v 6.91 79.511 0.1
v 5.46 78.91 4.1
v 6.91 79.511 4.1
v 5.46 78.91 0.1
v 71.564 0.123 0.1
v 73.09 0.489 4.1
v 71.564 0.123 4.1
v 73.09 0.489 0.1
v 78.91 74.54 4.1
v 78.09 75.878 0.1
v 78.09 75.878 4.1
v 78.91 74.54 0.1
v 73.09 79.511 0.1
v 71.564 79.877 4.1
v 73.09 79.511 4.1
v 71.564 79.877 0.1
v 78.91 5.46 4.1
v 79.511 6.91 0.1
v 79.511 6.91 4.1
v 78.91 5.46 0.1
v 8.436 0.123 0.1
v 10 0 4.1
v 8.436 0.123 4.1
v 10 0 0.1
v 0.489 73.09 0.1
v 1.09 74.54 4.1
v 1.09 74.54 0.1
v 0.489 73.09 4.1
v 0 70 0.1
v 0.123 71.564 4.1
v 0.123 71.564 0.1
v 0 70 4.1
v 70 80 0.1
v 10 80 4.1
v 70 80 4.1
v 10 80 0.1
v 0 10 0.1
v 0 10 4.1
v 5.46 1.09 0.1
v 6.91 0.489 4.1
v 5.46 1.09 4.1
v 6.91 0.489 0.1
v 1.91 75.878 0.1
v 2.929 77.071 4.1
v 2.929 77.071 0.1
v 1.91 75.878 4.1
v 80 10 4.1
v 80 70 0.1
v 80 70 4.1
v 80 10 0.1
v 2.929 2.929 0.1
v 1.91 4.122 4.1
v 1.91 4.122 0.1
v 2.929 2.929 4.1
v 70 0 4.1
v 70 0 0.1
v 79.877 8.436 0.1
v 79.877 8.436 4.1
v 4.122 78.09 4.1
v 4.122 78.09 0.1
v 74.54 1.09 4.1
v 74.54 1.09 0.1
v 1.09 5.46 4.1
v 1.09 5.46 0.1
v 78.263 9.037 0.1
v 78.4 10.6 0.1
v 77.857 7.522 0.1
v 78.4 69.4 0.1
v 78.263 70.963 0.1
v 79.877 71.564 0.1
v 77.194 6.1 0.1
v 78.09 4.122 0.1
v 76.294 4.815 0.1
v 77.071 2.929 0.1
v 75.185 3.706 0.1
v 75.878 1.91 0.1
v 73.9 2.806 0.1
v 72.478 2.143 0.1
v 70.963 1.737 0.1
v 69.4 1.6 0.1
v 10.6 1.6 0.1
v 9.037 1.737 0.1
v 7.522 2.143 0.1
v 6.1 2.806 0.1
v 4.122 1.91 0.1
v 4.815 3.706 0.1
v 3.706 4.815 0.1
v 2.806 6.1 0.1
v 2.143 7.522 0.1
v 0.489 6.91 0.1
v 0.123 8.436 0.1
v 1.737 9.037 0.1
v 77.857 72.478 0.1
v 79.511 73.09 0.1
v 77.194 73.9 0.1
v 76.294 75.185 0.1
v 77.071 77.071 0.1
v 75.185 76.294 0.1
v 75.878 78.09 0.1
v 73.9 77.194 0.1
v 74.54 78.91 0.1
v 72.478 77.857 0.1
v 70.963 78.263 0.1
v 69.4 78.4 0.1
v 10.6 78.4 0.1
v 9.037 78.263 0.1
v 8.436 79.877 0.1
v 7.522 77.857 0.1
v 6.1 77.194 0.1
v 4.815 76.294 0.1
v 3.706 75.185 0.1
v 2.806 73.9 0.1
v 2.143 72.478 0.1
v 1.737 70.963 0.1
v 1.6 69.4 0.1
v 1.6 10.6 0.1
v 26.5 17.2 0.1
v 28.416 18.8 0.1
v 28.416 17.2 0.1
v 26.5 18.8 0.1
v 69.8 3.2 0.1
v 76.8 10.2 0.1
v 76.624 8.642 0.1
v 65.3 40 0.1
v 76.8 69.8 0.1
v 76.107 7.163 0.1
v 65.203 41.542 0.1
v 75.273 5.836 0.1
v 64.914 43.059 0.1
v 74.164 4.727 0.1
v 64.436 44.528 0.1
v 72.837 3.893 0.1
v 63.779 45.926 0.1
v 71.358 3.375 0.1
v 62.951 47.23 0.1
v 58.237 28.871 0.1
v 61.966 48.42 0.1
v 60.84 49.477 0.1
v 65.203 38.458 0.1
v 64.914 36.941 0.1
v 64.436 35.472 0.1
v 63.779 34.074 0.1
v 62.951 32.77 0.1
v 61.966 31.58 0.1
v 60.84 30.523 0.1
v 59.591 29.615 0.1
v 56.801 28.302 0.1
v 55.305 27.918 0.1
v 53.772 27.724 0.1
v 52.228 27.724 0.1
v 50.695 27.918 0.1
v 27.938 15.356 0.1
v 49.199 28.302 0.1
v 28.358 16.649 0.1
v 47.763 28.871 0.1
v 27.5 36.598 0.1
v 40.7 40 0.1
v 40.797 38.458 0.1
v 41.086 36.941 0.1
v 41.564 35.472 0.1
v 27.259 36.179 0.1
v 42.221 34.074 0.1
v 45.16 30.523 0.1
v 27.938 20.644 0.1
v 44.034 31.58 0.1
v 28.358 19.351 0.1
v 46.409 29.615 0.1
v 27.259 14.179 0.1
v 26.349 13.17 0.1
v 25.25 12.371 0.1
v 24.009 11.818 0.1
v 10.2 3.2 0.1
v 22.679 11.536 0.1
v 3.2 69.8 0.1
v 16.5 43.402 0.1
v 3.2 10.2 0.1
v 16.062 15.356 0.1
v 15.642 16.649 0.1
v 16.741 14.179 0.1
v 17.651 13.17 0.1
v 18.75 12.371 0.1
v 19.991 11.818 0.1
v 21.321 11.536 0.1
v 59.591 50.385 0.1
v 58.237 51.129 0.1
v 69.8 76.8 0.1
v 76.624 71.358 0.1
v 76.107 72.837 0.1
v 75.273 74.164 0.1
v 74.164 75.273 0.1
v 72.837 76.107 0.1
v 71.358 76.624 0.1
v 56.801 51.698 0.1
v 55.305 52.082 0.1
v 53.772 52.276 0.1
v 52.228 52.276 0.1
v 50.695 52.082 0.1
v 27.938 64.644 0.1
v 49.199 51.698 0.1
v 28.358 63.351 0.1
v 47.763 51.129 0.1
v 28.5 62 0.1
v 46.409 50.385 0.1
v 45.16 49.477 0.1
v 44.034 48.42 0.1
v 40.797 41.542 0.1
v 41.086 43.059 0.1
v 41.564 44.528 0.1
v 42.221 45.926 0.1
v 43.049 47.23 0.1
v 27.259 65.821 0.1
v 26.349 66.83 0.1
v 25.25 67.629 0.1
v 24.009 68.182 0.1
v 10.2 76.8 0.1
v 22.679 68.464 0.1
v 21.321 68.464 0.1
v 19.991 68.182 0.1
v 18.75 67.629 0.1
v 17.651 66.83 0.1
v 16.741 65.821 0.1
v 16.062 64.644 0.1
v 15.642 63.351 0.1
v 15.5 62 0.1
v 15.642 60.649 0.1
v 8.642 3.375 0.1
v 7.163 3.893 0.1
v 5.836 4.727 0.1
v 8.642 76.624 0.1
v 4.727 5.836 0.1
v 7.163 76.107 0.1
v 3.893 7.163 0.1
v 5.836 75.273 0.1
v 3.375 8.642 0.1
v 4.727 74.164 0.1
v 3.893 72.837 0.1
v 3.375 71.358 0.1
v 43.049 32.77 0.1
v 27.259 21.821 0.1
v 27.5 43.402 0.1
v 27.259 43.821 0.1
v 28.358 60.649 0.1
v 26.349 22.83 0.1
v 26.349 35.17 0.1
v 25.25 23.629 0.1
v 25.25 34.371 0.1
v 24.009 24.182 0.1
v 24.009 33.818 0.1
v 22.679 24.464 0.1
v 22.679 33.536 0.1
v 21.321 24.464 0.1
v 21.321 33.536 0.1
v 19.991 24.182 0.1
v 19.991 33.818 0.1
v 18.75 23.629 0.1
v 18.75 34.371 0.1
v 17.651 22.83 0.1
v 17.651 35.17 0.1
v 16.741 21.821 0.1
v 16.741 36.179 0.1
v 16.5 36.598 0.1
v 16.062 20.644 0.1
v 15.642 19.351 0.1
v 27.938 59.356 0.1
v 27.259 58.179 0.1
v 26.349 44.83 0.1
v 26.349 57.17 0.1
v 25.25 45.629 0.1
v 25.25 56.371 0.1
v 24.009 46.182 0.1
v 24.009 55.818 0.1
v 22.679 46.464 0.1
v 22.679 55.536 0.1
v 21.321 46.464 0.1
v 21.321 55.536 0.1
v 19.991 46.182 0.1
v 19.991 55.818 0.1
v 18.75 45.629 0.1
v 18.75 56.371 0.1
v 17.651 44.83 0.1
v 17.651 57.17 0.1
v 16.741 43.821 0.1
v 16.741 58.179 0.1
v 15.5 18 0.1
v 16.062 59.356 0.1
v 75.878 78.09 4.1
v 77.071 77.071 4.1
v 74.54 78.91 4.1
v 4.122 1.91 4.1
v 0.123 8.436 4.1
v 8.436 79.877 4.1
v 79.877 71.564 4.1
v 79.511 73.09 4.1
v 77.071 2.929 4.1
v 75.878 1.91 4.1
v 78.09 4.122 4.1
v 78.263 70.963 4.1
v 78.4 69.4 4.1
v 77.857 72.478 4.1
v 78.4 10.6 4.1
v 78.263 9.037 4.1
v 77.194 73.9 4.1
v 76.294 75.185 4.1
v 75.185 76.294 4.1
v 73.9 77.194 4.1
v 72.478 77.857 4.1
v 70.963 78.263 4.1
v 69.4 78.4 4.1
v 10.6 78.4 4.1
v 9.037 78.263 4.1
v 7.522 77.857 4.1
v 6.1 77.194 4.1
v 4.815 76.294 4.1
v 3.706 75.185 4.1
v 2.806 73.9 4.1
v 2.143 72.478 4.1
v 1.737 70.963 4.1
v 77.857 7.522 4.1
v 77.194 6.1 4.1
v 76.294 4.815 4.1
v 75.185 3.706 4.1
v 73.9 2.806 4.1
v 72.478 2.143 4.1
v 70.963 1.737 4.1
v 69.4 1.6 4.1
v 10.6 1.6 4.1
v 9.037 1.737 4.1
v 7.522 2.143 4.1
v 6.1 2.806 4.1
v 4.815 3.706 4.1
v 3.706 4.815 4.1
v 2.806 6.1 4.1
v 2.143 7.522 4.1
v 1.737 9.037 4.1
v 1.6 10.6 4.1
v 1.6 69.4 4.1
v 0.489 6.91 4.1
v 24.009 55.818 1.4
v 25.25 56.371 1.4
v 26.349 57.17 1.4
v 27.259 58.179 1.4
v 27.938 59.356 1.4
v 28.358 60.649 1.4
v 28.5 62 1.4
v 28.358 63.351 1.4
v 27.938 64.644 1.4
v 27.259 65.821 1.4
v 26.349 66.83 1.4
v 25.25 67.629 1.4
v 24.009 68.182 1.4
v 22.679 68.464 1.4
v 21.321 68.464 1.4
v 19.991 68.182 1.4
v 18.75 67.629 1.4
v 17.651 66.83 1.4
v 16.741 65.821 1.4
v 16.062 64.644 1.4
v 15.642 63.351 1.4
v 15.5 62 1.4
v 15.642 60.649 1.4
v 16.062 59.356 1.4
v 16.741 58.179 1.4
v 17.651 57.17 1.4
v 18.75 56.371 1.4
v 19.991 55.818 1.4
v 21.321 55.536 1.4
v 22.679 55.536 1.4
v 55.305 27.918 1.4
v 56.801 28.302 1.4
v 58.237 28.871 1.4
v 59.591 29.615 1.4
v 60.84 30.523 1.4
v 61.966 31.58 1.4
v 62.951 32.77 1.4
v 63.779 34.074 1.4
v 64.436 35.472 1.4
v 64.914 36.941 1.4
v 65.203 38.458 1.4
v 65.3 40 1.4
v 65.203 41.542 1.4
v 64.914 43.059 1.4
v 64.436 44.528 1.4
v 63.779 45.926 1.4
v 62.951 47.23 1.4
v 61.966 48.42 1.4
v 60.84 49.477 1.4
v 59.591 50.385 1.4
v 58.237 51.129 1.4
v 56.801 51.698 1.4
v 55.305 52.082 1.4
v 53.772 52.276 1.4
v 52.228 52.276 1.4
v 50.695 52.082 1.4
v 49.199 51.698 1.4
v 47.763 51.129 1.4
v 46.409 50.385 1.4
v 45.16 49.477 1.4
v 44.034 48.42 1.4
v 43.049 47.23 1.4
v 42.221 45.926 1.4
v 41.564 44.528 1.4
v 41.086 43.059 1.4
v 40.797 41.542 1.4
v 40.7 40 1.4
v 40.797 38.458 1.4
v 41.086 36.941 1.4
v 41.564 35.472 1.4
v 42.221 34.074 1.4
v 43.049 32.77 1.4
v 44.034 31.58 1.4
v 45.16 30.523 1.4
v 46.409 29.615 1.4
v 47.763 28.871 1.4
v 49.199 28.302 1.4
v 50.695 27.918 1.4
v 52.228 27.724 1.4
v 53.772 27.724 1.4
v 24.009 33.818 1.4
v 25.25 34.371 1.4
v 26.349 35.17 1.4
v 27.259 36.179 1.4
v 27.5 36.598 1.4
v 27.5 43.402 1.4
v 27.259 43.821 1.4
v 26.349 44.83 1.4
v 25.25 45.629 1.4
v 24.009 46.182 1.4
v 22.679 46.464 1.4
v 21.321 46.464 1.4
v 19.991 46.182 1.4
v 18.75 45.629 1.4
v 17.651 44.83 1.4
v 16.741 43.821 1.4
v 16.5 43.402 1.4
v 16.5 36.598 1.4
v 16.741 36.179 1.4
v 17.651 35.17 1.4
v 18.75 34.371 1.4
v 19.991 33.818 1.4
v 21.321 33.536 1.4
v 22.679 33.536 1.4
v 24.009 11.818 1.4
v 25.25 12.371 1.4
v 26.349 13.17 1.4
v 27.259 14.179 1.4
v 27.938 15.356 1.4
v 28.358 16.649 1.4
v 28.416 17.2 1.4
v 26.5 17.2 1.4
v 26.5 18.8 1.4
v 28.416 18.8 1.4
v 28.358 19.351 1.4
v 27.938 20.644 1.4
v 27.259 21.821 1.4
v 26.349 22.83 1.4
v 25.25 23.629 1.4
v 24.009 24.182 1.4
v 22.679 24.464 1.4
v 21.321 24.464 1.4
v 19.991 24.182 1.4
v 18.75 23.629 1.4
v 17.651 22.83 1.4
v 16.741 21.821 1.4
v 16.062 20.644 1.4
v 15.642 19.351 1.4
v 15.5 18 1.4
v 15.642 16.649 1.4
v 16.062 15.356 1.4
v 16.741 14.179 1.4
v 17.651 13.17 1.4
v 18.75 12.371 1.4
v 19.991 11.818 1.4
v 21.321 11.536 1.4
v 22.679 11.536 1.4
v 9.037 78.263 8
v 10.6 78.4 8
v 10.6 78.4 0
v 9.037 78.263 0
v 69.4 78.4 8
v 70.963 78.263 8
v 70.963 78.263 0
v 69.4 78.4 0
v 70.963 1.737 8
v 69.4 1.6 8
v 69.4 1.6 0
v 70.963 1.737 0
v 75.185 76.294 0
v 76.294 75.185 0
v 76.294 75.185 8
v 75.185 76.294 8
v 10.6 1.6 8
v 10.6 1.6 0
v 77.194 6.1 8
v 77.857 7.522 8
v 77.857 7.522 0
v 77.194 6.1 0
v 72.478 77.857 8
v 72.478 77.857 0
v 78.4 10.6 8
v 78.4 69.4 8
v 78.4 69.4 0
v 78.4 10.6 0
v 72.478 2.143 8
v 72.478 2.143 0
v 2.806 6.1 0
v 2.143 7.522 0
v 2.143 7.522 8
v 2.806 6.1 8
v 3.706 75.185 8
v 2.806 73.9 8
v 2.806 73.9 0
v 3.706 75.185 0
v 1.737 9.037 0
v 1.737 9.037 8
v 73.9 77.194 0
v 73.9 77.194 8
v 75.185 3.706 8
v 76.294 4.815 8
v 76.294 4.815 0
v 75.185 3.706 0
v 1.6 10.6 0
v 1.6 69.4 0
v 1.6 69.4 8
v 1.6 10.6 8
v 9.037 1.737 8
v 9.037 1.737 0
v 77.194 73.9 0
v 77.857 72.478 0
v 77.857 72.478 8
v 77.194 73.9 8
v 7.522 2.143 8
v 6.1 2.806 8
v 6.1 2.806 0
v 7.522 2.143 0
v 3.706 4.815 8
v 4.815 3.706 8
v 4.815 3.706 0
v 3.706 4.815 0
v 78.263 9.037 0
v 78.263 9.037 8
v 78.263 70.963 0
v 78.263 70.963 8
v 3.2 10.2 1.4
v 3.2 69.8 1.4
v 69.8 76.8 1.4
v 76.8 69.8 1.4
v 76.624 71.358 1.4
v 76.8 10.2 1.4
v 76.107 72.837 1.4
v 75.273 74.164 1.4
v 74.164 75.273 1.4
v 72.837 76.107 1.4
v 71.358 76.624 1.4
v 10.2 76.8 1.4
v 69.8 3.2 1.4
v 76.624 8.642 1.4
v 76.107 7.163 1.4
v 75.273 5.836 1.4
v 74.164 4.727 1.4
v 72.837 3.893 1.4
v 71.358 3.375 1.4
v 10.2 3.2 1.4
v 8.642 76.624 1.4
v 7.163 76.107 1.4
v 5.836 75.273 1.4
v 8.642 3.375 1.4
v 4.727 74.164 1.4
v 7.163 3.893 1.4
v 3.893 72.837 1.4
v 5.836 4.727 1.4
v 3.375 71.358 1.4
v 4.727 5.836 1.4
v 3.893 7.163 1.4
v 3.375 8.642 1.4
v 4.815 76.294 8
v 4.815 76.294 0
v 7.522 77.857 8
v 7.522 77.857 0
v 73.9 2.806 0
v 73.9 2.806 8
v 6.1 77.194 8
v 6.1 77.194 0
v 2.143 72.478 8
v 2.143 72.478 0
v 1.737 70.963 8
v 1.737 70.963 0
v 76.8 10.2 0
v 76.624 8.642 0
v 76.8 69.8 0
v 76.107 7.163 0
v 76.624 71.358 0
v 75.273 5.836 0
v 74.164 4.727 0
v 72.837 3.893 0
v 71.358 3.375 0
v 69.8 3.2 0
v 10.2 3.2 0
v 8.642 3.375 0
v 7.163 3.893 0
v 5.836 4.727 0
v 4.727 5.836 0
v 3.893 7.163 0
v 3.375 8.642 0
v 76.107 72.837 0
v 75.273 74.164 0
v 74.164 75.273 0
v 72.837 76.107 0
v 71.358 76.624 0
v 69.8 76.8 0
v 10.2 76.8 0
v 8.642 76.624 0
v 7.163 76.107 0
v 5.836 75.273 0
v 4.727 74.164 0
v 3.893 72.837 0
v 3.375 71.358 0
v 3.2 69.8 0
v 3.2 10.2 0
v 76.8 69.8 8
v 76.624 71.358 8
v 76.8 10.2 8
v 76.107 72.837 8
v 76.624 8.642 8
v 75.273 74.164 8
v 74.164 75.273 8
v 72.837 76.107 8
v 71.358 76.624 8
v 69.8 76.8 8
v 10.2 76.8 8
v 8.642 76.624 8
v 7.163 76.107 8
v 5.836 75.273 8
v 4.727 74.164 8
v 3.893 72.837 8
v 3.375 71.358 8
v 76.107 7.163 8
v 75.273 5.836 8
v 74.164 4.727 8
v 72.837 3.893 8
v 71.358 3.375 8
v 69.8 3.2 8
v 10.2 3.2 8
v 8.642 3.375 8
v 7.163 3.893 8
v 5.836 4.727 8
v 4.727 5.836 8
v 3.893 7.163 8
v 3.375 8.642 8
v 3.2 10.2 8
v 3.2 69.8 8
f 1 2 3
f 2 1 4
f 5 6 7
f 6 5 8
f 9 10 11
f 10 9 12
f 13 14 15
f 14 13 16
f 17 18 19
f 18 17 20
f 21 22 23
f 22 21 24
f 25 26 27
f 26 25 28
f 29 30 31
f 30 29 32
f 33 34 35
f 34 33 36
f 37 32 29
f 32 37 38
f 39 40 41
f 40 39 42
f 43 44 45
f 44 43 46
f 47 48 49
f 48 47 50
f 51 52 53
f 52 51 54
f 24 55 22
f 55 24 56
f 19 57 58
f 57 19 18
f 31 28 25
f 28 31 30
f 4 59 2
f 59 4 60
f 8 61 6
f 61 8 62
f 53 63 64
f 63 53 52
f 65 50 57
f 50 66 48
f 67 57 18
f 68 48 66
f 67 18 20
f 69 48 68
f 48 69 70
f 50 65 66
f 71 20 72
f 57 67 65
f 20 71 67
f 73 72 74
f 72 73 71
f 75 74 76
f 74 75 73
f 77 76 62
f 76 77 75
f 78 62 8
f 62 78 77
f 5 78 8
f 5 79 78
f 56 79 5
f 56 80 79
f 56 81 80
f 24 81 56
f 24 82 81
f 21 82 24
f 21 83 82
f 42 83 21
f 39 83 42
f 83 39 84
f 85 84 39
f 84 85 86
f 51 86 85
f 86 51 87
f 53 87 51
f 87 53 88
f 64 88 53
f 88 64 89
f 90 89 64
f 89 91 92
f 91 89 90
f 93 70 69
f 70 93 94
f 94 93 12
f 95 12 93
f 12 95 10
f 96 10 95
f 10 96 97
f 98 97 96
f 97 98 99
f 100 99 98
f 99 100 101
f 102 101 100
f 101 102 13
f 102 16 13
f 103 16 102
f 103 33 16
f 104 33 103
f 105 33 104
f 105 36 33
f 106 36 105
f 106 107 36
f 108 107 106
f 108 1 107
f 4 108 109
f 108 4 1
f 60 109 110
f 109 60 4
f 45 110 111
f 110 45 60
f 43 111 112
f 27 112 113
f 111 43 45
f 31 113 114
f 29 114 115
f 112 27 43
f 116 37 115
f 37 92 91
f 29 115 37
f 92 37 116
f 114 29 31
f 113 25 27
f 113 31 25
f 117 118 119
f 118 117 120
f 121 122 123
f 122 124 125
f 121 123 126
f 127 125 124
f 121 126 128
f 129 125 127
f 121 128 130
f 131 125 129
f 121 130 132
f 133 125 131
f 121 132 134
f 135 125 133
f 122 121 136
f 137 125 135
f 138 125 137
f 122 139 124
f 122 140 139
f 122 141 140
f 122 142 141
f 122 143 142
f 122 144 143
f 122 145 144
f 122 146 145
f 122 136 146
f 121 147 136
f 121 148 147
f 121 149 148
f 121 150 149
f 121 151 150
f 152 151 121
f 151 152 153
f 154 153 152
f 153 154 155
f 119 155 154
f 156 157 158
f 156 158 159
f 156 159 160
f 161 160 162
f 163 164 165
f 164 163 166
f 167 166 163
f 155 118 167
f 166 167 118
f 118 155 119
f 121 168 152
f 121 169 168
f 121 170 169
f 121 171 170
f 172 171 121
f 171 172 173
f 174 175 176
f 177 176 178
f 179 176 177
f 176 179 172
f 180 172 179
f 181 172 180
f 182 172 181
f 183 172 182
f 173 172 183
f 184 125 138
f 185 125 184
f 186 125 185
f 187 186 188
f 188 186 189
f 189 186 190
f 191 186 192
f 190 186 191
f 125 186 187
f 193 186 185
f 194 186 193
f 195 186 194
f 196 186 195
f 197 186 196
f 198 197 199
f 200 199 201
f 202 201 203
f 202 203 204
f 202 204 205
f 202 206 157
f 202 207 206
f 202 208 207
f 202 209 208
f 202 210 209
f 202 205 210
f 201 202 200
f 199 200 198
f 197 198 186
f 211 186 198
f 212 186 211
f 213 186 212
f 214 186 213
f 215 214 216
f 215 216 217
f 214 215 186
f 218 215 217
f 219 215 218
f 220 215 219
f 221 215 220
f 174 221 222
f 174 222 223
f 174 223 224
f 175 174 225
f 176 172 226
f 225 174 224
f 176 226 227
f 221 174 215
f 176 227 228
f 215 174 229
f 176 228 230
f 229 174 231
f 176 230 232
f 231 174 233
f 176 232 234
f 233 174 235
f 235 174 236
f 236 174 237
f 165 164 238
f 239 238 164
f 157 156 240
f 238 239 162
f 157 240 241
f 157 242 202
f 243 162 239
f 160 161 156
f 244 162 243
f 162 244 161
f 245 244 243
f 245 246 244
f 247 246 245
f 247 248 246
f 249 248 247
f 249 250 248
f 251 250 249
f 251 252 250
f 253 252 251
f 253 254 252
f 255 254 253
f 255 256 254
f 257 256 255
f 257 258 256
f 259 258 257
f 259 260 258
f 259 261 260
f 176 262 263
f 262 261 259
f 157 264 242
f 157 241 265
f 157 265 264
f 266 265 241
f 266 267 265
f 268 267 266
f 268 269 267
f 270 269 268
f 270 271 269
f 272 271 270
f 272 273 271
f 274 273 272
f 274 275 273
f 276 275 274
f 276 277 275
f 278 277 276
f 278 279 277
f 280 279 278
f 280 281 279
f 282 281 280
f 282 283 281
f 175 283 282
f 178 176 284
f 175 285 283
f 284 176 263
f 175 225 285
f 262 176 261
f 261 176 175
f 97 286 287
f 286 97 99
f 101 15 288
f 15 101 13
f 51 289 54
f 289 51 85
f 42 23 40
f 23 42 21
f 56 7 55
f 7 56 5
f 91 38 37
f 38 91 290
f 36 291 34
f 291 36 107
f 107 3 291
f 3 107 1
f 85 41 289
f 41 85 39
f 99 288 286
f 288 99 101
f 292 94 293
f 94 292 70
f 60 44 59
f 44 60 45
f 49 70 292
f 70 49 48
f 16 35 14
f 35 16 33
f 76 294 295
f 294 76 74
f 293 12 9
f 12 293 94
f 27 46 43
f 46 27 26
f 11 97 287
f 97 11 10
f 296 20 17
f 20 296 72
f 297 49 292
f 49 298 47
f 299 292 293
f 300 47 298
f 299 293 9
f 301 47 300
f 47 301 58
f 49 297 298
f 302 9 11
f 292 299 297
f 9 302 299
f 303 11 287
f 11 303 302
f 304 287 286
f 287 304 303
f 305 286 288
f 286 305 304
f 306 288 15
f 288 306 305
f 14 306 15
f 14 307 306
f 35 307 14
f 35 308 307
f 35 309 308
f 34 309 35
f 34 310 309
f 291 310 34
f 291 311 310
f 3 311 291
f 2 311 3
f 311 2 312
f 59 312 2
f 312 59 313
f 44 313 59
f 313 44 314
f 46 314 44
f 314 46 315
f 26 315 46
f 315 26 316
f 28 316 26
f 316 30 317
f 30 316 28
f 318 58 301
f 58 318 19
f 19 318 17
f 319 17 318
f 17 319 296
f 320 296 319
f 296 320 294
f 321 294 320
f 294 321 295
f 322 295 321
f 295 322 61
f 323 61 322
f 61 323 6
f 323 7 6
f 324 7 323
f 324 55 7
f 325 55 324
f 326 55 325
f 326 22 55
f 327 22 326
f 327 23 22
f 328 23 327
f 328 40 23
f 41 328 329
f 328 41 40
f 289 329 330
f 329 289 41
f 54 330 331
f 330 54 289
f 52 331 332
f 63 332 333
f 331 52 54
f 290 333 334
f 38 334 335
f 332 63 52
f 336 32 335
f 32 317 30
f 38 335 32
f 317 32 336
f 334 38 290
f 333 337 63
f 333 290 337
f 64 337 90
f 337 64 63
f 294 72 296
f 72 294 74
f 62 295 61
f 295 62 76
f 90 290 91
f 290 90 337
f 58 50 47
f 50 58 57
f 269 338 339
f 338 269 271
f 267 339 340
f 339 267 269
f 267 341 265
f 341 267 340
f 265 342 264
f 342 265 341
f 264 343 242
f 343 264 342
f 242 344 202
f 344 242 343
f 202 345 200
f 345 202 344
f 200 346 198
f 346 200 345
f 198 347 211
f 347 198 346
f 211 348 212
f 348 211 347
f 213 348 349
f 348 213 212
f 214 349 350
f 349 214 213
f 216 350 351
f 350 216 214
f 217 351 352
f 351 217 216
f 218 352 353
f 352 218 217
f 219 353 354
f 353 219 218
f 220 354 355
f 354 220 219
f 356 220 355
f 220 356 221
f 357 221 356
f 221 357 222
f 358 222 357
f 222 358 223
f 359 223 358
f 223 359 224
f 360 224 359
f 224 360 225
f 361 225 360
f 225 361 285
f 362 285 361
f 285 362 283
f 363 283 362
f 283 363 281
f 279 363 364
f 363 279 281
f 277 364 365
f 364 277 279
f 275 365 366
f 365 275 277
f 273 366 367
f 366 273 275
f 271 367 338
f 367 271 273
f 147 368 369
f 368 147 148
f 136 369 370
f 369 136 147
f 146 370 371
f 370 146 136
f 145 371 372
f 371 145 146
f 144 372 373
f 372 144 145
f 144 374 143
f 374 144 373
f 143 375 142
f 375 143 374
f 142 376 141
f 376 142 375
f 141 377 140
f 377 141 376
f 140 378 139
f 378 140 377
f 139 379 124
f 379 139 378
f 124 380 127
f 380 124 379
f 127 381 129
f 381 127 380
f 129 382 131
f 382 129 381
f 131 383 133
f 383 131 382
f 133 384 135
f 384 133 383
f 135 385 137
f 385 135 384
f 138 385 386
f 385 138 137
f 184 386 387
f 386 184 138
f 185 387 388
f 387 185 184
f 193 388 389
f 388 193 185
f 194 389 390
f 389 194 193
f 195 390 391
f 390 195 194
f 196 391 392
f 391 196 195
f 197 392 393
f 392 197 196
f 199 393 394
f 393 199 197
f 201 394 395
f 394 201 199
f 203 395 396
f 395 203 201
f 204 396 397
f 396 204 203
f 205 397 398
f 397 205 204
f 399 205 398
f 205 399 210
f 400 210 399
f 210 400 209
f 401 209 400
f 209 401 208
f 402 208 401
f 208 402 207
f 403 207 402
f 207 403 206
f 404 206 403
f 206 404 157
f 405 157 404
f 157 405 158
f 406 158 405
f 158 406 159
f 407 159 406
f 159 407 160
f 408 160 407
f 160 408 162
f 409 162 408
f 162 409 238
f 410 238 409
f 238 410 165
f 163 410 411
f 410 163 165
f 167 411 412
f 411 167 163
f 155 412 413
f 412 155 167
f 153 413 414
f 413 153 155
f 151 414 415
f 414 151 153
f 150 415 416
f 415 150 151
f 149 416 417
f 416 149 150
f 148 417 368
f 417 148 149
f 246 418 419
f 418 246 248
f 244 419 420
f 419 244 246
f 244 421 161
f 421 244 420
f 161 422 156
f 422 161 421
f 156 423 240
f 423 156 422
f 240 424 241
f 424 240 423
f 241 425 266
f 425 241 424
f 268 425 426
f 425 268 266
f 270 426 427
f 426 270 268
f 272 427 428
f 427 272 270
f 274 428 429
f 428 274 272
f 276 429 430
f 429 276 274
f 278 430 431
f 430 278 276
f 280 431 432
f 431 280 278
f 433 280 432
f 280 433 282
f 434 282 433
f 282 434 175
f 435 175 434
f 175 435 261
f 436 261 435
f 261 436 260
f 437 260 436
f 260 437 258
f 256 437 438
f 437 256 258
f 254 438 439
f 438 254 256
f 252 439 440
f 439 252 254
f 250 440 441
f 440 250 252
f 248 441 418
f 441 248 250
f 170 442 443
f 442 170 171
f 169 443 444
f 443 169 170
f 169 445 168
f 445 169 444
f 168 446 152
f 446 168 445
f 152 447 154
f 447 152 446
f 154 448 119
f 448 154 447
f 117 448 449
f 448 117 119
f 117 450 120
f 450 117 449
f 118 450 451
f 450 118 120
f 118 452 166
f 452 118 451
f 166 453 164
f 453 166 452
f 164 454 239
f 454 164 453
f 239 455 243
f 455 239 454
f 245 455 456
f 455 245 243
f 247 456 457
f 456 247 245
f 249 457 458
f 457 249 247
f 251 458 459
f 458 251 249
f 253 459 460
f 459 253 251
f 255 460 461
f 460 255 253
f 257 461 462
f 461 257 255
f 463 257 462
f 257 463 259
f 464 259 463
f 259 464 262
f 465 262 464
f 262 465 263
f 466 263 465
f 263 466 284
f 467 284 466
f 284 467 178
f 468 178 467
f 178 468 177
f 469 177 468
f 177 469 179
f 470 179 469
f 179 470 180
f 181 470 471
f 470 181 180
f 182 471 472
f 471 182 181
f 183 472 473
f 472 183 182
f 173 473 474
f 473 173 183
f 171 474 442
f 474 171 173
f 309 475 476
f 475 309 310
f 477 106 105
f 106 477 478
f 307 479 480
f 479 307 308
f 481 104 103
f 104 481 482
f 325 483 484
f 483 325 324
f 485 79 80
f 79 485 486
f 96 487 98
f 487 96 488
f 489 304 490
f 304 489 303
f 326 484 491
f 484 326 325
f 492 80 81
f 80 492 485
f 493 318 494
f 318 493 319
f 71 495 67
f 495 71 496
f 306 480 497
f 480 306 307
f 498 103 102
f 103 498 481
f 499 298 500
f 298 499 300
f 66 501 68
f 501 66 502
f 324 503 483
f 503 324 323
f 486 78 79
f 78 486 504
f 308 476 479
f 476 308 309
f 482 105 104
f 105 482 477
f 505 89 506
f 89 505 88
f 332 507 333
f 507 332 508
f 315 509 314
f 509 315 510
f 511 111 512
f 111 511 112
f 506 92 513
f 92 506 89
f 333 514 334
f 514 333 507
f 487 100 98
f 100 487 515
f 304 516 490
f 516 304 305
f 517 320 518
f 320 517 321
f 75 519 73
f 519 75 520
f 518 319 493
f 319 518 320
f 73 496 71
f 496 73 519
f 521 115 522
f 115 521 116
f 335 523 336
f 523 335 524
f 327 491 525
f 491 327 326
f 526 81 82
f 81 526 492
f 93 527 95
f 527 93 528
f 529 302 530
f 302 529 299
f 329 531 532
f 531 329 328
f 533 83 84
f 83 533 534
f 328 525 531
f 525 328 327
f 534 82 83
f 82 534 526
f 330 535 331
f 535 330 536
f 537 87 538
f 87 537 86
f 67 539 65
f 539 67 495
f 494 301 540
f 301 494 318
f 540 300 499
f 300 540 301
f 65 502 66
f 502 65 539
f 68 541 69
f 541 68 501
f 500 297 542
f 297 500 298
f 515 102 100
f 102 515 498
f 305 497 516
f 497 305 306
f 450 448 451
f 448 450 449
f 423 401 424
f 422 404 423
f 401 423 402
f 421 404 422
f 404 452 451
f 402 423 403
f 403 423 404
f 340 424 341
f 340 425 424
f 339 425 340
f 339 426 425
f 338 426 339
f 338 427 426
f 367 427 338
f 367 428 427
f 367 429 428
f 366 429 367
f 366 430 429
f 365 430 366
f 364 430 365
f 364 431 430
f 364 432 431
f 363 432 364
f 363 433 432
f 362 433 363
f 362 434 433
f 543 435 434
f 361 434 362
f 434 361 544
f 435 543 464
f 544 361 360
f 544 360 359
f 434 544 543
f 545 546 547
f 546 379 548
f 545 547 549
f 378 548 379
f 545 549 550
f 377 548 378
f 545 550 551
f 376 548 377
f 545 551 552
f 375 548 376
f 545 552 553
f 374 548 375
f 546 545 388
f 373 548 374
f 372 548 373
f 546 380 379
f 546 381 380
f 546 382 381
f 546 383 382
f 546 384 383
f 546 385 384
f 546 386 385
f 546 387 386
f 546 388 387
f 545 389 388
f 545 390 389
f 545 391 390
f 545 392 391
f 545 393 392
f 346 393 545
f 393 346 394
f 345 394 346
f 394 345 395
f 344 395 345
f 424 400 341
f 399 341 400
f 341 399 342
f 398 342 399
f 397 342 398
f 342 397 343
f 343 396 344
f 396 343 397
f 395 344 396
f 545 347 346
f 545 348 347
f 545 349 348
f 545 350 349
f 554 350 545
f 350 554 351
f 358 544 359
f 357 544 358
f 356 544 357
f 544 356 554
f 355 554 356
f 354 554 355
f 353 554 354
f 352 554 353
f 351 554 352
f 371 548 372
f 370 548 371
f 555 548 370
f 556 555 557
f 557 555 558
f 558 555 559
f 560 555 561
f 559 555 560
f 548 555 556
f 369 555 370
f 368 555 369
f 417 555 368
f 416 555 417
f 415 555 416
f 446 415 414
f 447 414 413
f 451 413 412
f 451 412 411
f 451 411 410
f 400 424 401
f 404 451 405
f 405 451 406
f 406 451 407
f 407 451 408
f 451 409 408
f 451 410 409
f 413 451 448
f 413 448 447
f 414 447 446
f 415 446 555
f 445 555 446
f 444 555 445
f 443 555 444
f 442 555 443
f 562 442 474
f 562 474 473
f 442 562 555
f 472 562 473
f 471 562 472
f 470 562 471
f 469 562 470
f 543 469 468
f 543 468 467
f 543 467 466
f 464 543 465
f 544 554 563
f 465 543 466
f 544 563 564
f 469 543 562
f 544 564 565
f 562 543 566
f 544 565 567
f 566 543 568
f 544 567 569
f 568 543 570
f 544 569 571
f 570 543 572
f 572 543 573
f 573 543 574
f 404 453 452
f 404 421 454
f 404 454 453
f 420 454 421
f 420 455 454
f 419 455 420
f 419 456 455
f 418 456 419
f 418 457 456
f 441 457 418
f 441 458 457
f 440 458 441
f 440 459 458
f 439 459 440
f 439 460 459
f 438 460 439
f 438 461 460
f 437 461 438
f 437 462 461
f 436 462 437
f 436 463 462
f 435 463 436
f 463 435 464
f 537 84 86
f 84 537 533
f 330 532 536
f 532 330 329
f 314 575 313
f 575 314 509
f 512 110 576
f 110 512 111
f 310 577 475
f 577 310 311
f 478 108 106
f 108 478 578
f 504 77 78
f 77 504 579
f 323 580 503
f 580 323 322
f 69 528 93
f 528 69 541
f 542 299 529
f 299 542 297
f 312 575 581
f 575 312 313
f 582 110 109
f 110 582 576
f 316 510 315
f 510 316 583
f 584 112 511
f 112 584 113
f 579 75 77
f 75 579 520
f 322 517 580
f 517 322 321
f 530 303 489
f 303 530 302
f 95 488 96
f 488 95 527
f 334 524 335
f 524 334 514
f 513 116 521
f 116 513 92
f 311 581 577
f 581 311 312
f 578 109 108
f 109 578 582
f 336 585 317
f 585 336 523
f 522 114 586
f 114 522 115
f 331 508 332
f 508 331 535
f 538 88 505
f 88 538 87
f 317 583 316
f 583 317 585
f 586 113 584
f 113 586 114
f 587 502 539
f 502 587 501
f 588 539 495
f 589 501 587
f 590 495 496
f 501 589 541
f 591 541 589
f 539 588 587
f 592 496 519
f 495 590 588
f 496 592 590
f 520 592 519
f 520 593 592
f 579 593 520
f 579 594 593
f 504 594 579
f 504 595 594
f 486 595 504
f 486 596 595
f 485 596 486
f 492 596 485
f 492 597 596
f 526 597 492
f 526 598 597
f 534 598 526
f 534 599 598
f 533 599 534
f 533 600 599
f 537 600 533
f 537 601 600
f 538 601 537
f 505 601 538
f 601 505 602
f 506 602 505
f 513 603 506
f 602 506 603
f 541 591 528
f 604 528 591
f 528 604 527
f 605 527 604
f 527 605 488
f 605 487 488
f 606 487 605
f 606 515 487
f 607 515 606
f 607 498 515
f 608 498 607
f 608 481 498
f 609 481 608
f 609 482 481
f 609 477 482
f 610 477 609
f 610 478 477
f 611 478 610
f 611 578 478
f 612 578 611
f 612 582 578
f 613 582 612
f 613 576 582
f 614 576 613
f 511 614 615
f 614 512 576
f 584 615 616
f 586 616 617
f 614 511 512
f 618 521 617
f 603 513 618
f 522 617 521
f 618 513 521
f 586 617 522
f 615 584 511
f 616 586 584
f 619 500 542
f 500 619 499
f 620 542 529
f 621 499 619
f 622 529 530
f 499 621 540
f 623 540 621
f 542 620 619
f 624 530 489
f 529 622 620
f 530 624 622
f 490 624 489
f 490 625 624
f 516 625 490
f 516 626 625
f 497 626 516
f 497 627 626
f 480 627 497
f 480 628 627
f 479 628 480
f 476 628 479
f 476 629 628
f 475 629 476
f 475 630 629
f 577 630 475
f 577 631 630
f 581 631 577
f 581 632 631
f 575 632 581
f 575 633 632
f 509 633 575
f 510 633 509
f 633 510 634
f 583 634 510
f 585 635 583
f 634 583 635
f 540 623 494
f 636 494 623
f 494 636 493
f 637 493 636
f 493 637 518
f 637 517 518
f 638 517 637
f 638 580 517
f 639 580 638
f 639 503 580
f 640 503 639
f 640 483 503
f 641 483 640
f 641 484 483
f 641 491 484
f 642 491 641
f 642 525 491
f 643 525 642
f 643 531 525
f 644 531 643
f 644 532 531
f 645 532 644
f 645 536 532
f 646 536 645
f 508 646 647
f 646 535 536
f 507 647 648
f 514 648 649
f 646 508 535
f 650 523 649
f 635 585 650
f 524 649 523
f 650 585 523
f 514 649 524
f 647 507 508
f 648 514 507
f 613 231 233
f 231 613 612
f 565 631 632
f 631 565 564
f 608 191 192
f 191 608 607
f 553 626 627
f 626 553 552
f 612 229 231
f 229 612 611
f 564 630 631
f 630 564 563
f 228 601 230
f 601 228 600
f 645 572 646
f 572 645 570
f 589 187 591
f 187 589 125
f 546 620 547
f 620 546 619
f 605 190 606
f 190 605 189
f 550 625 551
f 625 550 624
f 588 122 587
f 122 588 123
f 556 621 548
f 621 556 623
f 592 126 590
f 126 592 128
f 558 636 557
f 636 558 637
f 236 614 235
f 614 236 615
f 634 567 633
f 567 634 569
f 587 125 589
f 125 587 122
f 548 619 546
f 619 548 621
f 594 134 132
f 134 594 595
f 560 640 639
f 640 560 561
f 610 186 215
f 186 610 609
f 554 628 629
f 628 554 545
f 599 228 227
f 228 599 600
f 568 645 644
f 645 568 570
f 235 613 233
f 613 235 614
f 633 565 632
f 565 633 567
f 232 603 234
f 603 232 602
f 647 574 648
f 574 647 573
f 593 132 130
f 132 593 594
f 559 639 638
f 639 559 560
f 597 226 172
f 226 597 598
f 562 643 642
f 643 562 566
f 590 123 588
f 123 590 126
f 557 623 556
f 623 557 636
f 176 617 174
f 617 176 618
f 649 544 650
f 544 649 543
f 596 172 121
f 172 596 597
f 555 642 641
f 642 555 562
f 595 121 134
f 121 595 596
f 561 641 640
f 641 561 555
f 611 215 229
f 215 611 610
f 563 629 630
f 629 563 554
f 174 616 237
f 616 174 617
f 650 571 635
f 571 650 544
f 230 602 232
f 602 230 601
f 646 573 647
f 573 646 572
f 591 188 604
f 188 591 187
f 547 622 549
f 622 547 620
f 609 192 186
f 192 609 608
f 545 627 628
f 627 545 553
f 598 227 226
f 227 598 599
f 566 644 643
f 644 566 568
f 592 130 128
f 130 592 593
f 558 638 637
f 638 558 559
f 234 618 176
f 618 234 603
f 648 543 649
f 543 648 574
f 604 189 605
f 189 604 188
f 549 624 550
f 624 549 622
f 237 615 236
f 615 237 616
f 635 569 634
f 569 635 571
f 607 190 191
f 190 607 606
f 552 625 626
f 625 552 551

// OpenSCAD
boxw=80;
boxh=80;
boxd=4;
wallt=1.6;
rr=10;
take1();
module take2() {
difference() {
  cube([80,30,3]);
  translate([15,15,-.01]) encoder_cutout();
  translate([65,15,-.01]) encoder_cutout();
}
}
module take1(tw=boxw,th=boxh,td=boxd,wallt=wallt) {
 {
   difference() {
    translate([0,0,0.1]) cube2([tw,th,td],rr);
    linear_extrude(wallt) {
      *translate([tw/2,14]) slider_cutout();
      translate([22,th/4-2]) toggle_switch_cutout();
      translate([22,th/2]) key_switch_cutout();
      translate([22,th/4*3+2]) circle(d=13,$fn=30);
      *translate([14,52]) toggle_switch_cutout();
      //translate([tw-16,th-16]) encoder_cutout();
      translate([tw-27,th/2]) lightup_button_cutout();
    }
    translate([wallt,wallt,wallt-0.2]) cube2([tw-wallt*2,th-wallt*2,td+rr],rr-(boxd>20?2:1),boxd>20);
  }
    if(boxd<20)
      difference() {
    translate([wallt,wallt]) cube2([tw-wallt*2,th-wallt*2,td+4],rr-1,0);
    translate([wallt*2,wallt*2,-.01]) cube2([tw-wallt*4,th-wallt*4,td+5],rr-3,0);
        
      }
  /*
  cube([tw,wallt,td]);
  cube([wallt,th,td]);
  translate([0,th-wallt]) cube([tw,wallt,td]);
  translate([tw-wallt,0]) cube([wallt,th,td]);
  //*/
}
}
module encoder_cutout()
{
  cylinder(d=7.5,h=4,$fn=30);
  translate([-6.2,-6.2,2]) cube([12.4,12.4,2]);
  translate([-1.2,-7,2]) cube([2.4,2,2]);
}
module lightup_button_cutout()
{
  //circle(d=46,$fn=80);
  circle(d=24.6,$fn=50);
}
module toggle_switch_cutout()
{
  difference() {
    circle(d=13,$fn=30);
    translate([4.5,-.8]) square([2,1.6]);
  }
}

module key_switch_cutout()
{
  intersection(){
    circle(d=13,$fn=30);
    translate([-5.5,-6.5]) square([11,13]);
  }
}
module slider_cutout()
{
  translate([-32.5,0]) circle(d=3,$fn=20);
  translate([32.5,0]) circle(d=3,$fn=20);
  translate([-28,-2]) square([56,4]);
}
module cube2(dims,r=5,all=0)
{
  if(!all) {
    linear_extrude(dims[2]) {
      for(x=[r,dims[0]-r],y=[r,dims[1]-r])
        translate([x,y]) circle(r=r,$fn=r*4);
      translate([0,r]) square([dims[0],dims[1]-r*2]);
      translate([r,0]) square([dims[0]-r*2,dims[1]]);
    }
  } else {
    translate([r,r,r]) minkowski() {
      cube([dims[0]-r*2, dims[1]-r*2, dims[2]-r*2]);
      sphere(r=r,$fn=r*5);
    }
  }
}
